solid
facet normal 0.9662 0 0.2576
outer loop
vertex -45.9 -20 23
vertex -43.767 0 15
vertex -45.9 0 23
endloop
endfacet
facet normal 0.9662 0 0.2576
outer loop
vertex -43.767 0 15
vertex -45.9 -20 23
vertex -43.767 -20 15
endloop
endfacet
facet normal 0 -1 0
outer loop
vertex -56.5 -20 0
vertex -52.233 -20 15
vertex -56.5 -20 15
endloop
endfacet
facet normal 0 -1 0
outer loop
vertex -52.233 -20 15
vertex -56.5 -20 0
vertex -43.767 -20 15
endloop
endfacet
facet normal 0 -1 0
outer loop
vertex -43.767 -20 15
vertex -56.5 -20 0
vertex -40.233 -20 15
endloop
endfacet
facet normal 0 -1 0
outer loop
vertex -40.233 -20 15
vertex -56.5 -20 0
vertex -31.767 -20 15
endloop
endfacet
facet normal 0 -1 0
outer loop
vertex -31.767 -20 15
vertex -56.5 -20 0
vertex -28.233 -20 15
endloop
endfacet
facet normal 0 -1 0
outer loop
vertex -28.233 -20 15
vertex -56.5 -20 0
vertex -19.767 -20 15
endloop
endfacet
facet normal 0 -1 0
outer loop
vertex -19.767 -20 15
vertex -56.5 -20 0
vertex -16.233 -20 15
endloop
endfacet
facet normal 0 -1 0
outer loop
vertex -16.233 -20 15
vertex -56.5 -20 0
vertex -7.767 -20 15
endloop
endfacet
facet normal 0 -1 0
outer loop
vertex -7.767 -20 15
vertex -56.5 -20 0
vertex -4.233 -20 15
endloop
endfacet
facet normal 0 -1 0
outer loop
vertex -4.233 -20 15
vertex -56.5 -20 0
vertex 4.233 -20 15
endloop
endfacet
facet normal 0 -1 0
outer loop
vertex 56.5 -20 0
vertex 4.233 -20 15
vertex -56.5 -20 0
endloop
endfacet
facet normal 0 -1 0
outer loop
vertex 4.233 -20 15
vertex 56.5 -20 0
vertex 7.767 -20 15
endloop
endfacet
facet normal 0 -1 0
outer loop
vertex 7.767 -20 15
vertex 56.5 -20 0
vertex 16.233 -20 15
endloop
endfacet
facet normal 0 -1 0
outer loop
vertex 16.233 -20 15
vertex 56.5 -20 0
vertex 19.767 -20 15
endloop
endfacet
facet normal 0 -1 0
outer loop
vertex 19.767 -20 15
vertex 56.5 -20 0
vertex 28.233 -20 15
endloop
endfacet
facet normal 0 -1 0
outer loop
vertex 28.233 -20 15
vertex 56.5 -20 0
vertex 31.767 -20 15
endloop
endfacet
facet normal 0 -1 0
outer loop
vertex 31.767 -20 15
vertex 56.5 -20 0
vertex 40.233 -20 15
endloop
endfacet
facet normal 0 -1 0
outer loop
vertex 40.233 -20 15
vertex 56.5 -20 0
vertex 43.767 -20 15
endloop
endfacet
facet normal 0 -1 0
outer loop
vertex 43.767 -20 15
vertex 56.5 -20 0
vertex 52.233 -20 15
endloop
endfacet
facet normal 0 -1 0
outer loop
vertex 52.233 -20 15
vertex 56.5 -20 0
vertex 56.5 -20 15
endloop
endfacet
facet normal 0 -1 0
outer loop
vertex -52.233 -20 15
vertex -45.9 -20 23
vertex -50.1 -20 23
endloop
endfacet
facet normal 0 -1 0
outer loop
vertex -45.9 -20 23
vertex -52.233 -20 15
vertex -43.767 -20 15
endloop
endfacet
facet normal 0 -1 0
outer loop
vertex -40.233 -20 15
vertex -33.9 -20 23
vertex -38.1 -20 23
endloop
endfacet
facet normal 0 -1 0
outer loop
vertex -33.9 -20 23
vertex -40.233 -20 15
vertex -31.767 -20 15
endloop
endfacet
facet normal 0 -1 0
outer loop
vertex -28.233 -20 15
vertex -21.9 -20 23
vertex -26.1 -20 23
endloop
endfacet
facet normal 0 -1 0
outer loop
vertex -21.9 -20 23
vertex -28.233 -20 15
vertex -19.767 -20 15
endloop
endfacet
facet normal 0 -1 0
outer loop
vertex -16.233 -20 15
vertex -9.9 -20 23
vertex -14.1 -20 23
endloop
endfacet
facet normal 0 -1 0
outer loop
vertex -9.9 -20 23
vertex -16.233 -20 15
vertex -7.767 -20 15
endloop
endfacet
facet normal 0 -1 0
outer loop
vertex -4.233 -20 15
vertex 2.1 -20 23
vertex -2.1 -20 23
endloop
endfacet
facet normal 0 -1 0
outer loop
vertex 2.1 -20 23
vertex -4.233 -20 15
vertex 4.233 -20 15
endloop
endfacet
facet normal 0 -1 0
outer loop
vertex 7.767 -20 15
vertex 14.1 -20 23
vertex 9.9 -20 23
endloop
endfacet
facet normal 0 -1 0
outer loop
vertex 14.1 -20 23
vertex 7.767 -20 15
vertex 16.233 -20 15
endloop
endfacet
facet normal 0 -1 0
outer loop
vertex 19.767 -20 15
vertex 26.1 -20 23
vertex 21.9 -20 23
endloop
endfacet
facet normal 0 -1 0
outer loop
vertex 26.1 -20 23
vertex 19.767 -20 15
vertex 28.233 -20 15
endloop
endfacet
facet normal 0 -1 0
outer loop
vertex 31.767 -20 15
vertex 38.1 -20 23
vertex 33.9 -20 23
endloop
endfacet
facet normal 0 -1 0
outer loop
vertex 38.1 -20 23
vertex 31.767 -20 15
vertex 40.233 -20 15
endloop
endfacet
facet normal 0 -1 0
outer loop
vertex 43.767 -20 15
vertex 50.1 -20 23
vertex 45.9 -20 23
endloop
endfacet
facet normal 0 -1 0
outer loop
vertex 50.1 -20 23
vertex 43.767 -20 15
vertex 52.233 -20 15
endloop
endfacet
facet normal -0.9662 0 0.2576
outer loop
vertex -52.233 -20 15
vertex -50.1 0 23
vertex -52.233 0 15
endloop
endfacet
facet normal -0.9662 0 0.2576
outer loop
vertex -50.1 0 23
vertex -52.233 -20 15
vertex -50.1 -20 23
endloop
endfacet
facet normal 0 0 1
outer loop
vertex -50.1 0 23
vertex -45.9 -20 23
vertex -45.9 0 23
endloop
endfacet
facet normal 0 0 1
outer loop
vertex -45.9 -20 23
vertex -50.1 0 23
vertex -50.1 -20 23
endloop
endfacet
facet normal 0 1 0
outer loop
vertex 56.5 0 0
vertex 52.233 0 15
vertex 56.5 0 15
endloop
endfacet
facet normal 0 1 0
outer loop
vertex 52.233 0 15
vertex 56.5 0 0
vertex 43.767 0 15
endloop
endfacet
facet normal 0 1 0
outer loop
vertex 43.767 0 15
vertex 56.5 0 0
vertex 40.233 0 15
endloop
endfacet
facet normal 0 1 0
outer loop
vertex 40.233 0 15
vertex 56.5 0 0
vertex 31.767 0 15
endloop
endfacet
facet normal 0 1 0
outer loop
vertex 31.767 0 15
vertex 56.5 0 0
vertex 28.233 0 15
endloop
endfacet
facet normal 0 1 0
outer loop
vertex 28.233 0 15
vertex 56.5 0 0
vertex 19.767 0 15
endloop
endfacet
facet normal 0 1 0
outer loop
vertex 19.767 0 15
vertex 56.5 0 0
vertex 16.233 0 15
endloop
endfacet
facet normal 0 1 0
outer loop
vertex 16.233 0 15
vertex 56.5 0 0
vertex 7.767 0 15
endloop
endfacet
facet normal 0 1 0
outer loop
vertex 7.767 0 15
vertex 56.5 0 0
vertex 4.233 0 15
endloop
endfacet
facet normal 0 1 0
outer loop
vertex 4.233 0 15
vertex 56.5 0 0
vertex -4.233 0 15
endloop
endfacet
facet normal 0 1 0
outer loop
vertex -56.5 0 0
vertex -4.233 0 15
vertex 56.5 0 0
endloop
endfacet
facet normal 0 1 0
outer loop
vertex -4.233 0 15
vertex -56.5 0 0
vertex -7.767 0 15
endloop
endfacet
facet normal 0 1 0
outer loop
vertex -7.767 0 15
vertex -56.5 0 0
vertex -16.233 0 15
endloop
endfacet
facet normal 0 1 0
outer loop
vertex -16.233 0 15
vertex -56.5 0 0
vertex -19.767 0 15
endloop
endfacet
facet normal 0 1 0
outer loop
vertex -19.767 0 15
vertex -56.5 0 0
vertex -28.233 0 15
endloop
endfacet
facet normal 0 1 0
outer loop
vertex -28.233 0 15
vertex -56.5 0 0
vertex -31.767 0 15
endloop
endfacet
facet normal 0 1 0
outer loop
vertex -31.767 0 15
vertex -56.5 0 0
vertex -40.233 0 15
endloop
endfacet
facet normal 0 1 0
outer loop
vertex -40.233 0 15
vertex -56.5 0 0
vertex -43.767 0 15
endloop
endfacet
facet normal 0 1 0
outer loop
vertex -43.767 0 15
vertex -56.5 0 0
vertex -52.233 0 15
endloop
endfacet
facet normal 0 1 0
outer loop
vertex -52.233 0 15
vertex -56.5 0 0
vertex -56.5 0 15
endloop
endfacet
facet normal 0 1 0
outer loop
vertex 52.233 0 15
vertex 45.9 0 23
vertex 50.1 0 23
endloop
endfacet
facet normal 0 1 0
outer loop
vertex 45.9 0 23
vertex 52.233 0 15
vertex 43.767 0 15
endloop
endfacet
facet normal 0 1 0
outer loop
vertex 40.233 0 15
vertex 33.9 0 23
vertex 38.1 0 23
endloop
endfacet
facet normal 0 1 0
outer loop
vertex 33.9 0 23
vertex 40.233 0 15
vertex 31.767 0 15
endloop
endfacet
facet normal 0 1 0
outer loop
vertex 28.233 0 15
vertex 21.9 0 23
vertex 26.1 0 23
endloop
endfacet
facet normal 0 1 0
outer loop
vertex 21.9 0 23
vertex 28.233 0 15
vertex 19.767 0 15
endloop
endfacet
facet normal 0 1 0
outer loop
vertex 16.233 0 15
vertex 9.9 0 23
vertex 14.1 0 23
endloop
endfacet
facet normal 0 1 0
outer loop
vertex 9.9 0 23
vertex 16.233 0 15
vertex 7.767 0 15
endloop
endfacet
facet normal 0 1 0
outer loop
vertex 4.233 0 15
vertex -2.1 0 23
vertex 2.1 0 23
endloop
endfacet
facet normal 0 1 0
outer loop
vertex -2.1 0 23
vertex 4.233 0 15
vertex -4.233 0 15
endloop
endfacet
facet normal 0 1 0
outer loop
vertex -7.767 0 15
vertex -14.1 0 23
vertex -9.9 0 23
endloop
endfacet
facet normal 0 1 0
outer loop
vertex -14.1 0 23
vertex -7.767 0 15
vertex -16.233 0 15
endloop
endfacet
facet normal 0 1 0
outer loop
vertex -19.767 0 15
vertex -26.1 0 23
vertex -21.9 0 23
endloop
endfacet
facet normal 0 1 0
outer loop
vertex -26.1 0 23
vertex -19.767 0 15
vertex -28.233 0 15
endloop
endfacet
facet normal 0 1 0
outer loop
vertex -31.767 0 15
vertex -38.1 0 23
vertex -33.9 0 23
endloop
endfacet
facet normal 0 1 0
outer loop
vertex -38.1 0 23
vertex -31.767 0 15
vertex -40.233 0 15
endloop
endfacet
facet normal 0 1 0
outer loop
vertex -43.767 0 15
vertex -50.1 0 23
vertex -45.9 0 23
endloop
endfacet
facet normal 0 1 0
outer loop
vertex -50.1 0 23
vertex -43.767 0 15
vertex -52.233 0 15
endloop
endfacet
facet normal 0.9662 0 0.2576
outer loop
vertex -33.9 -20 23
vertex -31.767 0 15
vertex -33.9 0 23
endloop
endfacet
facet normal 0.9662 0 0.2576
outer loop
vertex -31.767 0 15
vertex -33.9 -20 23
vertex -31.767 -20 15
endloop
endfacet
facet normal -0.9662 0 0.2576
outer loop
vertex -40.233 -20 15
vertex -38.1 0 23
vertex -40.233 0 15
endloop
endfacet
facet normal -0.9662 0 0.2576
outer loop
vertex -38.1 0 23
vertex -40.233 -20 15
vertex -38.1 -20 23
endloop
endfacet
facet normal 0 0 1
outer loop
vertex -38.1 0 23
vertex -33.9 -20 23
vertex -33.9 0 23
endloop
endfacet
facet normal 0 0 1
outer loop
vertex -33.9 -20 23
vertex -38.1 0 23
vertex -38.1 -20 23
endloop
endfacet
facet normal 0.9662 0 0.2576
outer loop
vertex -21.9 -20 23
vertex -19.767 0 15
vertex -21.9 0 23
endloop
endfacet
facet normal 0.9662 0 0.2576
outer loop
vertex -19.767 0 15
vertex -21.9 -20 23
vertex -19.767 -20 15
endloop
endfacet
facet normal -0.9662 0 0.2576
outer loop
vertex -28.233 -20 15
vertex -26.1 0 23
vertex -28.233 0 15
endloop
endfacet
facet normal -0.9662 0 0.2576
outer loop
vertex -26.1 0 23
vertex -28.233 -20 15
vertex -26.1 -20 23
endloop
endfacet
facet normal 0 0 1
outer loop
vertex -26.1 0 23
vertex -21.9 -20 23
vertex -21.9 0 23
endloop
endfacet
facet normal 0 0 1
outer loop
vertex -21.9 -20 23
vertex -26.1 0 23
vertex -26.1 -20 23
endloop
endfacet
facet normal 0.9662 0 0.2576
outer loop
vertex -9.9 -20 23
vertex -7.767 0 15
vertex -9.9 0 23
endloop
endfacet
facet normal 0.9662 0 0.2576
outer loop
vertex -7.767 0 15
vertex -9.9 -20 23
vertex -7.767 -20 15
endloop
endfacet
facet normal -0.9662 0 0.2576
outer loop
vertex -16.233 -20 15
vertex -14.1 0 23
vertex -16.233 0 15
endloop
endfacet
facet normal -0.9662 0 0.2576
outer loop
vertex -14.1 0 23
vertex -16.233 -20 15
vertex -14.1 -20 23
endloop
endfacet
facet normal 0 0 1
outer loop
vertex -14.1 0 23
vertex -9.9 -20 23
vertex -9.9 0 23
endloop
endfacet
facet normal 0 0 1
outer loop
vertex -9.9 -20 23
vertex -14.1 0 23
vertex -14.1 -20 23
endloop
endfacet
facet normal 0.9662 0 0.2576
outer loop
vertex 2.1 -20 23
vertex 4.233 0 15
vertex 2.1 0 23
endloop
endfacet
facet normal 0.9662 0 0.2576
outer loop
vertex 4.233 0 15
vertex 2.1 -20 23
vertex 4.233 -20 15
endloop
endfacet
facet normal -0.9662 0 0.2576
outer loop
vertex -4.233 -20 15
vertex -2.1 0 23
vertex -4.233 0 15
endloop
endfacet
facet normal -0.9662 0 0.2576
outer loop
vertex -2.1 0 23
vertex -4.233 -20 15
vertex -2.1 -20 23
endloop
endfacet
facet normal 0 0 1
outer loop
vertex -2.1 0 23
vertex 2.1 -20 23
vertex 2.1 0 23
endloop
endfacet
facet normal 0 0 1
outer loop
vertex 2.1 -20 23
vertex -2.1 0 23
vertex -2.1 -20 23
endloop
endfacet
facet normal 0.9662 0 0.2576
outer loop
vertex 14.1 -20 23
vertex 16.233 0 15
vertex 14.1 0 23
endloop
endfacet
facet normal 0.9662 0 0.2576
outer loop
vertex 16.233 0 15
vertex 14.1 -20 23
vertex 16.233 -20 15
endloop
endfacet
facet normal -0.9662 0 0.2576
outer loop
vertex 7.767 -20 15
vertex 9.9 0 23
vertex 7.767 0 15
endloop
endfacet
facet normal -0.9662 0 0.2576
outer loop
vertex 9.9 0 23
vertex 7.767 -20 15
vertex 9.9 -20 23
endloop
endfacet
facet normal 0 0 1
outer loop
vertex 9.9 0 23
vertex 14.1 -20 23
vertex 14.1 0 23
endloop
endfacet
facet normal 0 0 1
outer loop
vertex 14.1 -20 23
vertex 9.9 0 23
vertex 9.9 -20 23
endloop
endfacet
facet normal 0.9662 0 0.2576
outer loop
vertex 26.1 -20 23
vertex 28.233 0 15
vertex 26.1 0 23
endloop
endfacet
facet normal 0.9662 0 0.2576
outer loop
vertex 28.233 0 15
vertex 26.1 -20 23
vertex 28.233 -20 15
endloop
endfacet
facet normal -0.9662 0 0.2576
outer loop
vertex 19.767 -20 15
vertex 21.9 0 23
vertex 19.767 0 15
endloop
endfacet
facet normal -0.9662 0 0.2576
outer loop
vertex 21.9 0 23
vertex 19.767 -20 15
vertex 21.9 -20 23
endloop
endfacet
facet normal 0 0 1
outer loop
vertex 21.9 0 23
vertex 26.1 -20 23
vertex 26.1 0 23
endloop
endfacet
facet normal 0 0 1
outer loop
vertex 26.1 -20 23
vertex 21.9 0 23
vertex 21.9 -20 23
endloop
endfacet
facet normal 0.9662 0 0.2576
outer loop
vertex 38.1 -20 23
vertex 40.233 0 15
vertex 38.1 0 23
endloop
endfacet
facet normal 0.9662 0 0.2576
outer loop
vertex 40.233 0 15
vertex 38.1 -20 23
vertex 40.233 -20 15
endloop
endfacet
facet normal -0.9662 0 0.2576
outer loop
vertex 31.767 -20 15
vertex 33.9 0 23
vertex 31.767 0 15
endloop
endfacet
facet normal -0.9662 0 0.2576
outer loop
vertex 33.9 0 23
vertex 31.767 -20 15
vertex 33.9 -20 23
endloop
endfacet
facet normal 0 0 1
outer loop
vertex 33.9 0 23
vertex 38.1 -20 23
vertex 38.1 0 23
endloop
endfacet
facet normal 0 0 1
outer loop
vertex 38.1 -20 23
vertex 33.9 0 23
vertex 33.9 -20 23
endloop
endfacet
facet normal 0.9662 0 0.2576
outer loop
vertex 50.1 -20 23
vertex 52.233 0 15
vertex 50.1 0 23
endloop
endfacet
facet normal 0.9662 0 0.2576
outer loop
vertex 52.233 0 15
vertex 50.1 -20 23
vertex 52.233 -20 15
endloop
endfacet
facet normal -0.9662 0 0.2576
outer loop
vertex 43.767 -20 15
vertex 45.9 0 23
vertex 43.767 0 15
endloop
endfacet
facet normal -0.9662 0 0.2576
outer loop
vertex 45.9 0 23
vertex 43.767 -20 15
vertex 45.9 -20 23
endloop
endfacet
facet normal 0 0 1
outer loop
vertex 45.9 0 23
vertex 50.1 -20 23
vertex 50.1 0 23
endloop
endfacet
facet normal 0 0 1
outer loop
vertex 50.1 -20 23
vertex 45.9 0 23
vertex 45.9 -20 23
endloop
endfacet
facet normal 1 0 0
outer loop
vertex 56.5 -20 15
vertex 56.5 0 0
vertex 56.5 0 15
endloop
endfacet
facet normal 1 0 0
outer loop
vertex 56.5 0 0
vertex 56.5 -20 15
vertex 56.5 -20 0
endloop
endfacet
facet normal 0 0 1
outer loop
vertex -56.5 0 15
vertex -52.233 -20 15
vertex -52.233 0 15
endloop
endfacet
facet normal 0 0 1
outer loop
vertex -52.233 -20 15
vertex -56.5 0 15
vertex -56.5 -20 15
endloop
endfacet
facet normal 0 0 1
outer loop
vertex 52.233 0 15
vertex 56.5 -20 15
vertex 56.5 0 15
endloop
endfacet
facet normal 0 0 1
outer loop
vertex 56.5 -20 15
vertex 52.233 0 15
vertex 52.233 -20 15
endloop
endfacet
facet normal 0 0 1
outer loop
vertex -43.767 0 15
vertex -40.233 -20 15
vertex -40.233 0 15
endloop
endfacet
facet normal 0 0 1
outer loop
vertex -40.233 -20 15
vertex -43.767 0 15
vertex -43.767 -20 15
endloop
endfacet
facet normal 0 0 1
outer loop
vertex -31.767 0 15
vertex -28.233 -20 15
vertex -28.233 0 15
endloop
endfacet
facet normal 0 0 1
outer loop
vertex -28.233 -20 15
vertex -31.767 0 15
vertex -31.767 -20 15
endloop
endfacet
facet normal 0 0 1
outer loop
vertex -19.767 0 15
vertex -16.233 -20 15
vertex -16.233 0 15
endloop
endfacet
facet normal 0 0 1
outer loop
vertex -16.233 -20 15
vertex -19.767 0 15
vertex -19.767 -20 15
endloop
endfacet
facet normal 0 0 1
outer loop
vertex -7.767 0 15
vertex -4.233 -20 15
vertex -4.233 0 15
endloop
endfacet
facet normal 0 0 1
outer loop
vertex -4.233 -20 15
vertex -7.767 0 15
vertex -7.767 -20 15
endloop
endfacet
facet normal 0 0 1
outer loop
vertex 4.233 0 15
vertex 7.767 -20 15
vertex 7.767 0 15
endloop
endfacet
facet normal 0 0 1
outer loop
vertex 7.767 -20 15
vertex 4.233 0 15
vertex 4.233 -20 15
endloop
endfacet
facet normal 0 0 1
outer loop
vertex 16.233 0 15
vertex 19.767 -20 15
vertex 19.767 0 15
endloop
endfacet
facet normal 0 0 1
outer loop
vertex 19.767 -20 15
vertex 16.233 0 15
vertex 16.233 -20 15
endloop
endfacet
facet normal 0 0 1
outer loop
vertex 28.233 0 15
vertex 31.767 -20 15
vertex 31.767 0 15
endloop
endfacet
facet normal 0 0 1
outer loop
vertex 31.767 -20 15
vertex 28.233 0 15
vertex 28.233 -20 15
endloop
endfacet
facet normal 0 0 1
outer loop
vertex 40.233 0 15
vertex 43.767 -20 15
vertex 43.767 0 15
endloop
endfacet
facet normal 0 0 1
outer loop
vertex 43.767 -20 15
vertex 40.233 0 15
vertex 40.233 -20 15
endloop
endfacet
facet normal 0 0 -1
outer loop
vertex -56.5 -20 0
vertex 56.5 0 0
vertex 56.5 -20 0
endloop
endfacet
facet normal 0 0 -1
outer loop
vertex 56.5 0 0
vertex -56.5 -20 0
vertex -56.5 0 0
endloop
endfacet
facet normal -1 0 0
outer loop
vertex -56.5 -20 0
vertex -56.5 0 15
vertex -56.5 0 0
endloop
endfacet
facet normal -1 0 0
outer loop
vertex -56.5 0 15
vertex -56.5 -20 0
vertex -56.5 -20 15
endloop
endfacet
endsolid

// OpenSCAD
$fn = 32;

// ----------------------------------------------------------------------
// Toothed rack, 9 teeth
// 12 mm pitch, 8 mm teeth
// ----------------------------------------------------------------------

// --- parameters (mm) ---
bar_w = 20;     // bar width (Y)
bar_h = 15;     // bar height (Z)
teeth = 9;      // number of teeth
pitch = 12;     // tooth pitch
tooth_h = 8;    // tooth height above the bar
root_w = 9;     // tooth width at the root
crest_w = 4.2;  // tooth width at the crest

// --- derived feature positions (mm) ---
span = (teeth - 1) * pitch;  // = 96   distance between the outer teeth
bar_l = span + root_w + 8;   // = 113   bar length: teeth plus 4 mm at each end
tooth_x = -span / 2;         // = -48   X of the first tooth
height = bar_h + tooth_h;    // = 23   overall height
feature_centers = [
  [tooth_x + 0 * pitch, -bar_w / 2],
  [tooth_x + 1 * pitch, -bar_w / 2],
  [tooth_x + 2 * pitch, -bar_w / 2],
  [tooth_x + 3 * pitch, -bar_w / 2],
  [tooth_x + 4 * pitch, -bar_w / 2],
  [tooth_x + 5 * pitch, -bar_w / 2],
  [tooth_x + 6 * pitch, -bar_w / 2],
  [tooth_x + 7 * pitch, -bar_w / 2],
  [tooth_x + 8 * pitch, -bar_w / 2]
];   // tooth centre line, drives the tooth loop

// bar with a rack of teeth, one extruded trapezoium per centre
module rack_tooth() {
  linear_extrude(height = bar_w)
    polygon(points = [
      [0, 0],
      [root_w, 0],
      [root_w / 2 + crest_w / 2, tooth_h + 1],
      [root_w / 2 - crest_w / 2, tooth_h + 1]
    ]);
}

union() {
  translate([-bar_l / 2, -bar_w, 0]) cube([bar_l, bar_w, bar_h]);
  for (centre = feature_centers)
    translate([centre[0] - root_w / 2, 0, bar_h - 1]) rotate([90, 0, 0]) rack_tooth();
}
